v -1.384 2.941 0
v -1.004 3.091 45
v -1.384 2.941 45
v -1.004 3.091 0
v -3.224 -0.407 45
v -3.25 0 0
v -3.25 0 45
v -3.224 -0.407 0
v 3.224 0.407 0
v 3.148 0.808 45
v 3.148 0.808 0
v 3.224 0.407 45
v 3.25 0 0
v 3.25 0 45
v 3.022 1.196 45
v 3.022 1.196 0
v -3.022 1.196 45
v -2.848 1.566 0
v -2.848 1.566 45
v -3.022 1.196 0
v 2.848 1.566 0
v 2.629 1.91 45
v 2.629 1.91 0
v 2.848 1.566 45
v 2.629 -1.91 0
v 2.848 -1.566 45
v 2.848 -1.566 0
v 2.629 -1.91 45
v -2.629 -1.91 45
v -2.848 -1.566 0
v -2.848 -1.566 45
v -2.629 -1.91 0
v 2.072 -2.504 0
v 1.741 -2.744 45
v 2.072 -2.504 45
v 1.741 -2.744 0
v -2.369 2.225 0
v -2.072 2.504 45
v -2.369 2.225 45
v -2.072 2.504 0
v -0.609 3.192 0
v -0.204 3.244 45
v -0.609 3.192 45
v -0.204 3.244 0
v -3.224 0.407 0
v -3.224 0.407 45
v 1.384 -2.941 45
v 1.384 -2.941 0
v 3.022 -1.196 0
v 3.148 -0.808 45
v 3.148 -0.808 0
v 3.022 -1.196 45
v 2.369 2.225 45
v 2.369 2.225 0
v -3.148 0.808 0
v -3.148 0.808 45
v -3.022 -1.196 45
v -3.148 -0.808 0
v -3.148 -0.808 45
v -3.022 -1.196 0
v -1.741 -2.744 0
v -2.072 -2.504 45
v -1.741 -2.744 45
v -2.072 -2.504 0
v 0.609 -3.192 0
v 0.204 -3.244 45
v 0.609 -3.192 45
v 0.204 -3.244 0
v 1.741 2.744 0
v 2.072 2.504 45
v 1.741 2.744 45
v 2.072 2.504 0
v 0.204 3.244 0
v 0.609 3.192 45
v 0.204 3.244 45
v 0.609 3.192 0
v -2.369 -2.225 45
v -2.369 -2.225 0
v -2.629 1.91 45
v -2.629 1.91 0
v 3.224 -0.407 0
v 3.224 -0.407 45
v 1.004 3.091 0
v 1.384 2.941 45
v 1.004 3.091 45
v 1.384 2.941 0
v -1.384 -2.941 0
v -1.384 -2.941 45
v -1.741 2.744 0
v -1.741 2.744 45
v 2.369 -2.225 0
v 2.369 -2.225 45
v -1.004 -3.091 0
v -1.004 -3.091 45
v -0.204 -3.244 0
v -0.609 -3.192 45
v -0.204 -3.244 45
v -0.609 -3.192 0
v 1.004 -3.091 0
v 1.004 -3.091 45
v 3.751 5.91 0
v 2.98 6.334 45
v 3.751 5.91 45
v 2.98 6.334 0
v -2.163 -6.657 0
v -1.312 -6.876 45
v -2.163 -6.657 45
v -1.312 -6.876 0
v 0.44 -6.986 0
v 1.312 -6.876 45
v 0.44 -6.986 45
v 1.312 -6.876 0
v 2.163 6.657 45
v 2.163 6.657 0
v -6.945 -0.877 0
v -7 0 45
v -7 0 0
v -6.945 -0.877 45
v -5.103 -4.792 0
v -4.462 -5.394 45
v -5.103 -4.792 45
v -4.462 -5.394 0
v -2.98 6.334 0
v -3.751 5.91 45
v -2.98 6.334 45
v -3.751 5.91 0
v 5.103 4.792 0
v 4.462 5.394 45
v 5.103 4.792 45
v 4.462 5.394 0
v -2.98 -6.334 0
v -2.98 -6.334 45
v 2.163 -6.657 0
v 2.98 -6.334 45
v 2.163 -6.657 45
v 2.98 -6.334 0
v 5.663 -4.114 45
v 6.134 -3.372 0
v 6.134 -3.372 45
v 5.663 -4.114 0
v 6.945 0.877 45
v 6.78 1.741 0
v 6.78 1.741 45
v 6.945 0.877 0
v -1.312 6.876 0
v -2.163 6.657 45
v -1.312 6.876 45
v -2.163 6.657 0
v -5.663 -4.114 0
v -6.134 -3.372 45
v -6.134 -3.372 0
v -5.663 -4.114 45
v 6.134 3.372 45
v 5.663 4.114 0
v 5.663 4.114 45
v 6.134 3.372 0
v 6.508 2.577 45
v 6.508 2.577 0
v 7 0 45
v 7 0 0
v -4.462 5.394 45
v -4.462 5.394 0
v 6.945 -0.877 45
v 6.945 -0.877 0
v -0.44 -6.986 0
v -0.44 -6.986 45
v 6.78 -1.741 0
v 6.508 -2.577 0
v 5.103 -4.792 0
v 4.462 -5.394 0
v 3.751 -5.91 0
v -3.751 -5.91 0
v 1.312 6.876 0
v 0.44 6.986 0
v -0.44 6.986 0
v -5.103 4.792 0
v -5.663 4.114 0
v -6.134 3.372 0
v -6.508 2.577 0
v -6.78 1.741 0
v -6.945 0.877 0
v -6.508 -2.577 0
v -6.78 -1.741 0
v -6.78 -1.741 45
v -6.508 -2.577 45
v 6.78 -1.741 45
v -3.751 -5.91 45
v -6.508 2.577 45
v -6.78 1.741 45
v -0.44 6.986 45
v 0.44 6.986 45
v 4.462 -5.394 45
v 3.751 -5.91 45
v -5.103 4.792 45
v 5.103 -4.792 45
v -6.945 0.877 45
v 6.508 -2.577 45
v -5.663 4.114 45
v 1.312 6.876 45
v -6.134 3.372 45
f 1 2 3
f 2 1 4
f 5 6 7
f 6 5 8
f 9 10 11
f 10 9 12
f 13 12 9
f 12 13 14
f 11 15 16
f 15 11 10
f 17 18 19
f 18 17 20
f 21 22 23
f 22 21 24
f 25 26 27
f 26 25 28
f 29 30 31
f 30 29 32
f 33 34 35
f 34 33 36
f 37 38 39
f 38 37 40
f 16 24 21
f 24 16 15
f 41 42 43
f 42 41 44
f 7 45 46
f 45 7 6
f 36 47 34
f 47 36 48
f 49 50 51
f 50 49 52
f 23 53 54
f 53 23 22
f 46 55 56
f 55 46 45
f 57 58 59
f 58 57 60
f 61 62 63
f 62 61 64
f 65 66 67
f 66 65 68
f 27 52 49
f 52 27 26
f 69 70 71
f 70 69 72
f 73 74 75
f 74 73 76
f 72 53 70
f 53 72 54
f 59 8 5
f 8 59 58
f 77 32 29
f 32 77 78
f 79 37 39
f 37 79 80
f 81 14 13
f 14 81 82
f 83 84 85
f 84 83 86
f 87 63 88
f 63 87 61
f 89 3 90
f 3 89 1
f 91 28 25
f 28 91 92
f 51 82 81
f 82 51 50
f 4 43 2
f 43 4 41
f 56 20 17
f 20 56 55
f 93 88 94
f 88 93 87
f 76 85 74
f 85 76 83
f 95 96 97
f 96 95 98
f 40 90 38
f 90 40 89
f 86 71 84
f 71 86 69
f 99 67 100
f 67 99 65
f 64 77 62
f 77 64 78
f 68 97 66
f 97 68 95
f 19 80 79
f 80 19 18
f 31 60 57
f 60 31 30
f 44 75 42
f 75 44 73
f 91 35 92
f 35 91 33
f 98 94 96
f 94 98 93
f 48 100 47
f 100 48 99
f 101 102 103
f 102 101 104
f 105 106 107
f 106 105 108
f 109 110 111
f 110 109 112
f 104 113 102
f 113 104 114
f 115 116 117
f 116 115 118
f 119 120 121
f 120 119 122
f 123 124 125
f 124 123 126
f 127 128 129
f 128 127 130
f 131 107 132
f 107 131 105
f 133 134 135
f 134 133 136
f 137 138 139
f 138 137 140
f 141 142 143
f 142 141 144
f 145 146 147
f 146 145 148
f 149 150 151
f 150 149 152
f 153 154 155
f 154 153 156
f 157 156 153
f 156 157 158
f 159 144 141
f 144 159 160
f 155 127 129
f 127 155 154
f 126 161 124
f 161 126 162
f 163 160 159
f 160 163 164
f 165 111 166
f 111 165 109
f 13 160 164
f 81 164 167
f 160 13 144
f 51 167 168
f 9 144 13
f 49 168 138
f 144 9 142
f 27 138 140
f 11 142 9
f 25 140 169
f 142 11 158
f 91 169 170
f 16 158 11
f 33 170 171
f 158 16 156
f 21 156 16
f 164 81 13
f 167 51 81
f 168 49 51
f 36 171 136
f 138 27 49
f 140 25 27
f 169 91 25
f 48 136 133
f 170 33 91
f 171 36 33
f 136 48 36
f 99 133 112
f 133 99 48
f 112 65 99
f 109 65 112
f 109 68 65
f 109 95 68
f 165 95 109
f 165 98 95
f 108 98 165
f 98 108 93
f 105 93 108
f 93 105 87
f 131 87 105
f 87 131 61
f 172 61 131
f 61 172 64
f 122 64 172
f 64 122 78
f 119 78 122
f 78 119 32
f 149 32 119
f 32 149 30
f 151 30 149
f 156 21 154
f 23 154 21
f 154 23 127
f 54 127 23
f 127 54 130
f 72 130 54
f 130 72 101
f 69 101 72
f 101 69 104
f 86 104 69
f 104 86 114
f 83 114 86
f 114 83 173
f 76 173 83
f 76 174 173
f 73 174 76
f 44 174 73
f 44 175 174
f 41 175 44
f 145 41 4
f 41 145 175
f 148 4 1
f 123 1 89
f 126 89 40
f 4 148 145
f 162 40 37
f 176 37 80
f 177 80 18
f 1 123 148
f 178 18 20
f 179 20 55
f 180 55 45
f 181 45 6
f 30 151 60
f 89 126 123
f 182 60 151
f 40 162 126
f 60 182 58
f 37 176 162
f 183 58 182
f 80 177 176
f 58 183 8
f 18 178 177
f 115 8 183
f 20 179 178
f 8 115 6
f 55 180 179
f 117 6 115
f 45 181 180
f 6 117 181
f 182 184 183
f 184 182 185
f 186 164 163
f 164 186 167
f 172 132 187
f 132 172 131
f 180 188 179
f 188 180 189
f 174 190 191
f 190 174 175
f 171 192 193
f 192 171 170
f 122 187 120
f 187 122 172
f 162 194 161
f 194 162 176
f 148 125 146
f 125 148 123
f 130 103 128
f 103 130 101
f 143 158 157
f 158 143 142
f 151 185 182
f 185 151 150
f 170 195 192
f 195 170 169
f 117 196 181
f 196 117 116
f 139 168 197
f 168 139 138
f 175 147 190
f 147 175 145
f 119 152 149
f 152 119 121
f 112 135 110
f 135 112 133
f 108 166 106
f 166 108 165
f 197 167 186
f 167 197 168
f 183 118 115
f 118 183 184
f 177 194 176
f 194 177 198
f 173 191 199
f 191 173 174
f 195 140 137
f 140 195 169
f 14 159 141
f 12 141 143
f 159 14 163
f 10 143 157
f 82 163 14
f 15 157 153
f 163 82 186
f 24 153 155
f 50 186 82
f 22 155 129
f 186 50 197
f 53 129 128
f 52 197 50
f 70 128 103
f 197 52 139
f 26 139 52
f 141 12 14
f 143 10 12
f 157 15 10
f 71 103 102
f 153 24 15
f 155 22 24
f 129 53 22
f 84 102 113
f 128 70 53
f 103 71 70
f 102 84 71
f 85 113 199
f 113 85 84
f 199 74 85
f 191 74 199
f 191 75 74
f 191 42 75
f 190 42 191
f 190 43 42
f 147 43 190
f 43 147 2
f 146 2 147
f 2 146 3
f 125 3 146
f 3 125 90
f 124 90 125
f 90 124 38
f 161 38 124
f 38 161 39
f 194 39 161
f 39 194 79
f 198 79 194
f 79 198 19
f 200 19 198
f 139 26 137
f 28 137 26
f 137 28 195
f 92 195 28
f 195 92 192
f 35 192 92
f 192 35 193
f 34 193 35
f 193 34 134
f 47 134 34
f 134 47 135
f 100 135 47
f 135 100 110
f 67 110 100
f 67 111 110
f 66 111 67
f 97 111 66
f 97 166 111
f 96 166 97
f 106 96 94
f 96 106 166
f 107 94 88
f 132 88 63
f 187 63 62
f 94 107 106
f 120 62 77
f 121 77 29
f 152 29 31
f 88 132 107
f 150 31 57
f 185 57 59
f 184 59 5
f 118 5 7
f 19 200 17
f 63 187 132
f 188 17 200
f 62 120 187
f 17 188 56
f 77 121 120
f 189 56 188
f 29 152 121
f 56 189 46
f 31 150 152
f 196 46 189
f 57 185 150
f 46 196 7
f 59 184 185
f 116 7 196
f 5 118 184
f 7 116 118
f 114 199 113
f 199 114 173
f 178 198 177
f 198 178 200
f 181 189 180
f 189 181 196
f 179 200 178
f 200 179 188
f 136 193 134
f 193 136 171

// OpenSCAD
$fn = 50;


difference() {
	union() {
		*color(alpha = 1.0000000000, c = "gray") {
			translate(v = [0, 7, 0]) {
				linear_extrude(height = 1) {
					text(font = "Arial:style=Bold", halign = "center", size = 4.5000000000, text = "COMMENT plate main", valign = "center");
				}
			}
		}
		cylinder(h = 45, r = 7.0000000000);
	}
	union() {
		*color(alpha = 1.0000000000, c = "gray") {
			translate(v = [0, 7, 0]) {
				linear_extrude(height = 1) {
					text(font = "Arial:style=Bold", halign = "center", size = 4.5000000000, text = "COMMENT holes main", valign = "center");
				}
			}
		}
		translate(v = [0, 0, -100]) {
			cylinder(h = 200, r = 3.2500000000);
		}
		translate(v = [0, 0, -100]) {
			cylinder(h = 200, r = 1.8000000000);
		}
	}
}
